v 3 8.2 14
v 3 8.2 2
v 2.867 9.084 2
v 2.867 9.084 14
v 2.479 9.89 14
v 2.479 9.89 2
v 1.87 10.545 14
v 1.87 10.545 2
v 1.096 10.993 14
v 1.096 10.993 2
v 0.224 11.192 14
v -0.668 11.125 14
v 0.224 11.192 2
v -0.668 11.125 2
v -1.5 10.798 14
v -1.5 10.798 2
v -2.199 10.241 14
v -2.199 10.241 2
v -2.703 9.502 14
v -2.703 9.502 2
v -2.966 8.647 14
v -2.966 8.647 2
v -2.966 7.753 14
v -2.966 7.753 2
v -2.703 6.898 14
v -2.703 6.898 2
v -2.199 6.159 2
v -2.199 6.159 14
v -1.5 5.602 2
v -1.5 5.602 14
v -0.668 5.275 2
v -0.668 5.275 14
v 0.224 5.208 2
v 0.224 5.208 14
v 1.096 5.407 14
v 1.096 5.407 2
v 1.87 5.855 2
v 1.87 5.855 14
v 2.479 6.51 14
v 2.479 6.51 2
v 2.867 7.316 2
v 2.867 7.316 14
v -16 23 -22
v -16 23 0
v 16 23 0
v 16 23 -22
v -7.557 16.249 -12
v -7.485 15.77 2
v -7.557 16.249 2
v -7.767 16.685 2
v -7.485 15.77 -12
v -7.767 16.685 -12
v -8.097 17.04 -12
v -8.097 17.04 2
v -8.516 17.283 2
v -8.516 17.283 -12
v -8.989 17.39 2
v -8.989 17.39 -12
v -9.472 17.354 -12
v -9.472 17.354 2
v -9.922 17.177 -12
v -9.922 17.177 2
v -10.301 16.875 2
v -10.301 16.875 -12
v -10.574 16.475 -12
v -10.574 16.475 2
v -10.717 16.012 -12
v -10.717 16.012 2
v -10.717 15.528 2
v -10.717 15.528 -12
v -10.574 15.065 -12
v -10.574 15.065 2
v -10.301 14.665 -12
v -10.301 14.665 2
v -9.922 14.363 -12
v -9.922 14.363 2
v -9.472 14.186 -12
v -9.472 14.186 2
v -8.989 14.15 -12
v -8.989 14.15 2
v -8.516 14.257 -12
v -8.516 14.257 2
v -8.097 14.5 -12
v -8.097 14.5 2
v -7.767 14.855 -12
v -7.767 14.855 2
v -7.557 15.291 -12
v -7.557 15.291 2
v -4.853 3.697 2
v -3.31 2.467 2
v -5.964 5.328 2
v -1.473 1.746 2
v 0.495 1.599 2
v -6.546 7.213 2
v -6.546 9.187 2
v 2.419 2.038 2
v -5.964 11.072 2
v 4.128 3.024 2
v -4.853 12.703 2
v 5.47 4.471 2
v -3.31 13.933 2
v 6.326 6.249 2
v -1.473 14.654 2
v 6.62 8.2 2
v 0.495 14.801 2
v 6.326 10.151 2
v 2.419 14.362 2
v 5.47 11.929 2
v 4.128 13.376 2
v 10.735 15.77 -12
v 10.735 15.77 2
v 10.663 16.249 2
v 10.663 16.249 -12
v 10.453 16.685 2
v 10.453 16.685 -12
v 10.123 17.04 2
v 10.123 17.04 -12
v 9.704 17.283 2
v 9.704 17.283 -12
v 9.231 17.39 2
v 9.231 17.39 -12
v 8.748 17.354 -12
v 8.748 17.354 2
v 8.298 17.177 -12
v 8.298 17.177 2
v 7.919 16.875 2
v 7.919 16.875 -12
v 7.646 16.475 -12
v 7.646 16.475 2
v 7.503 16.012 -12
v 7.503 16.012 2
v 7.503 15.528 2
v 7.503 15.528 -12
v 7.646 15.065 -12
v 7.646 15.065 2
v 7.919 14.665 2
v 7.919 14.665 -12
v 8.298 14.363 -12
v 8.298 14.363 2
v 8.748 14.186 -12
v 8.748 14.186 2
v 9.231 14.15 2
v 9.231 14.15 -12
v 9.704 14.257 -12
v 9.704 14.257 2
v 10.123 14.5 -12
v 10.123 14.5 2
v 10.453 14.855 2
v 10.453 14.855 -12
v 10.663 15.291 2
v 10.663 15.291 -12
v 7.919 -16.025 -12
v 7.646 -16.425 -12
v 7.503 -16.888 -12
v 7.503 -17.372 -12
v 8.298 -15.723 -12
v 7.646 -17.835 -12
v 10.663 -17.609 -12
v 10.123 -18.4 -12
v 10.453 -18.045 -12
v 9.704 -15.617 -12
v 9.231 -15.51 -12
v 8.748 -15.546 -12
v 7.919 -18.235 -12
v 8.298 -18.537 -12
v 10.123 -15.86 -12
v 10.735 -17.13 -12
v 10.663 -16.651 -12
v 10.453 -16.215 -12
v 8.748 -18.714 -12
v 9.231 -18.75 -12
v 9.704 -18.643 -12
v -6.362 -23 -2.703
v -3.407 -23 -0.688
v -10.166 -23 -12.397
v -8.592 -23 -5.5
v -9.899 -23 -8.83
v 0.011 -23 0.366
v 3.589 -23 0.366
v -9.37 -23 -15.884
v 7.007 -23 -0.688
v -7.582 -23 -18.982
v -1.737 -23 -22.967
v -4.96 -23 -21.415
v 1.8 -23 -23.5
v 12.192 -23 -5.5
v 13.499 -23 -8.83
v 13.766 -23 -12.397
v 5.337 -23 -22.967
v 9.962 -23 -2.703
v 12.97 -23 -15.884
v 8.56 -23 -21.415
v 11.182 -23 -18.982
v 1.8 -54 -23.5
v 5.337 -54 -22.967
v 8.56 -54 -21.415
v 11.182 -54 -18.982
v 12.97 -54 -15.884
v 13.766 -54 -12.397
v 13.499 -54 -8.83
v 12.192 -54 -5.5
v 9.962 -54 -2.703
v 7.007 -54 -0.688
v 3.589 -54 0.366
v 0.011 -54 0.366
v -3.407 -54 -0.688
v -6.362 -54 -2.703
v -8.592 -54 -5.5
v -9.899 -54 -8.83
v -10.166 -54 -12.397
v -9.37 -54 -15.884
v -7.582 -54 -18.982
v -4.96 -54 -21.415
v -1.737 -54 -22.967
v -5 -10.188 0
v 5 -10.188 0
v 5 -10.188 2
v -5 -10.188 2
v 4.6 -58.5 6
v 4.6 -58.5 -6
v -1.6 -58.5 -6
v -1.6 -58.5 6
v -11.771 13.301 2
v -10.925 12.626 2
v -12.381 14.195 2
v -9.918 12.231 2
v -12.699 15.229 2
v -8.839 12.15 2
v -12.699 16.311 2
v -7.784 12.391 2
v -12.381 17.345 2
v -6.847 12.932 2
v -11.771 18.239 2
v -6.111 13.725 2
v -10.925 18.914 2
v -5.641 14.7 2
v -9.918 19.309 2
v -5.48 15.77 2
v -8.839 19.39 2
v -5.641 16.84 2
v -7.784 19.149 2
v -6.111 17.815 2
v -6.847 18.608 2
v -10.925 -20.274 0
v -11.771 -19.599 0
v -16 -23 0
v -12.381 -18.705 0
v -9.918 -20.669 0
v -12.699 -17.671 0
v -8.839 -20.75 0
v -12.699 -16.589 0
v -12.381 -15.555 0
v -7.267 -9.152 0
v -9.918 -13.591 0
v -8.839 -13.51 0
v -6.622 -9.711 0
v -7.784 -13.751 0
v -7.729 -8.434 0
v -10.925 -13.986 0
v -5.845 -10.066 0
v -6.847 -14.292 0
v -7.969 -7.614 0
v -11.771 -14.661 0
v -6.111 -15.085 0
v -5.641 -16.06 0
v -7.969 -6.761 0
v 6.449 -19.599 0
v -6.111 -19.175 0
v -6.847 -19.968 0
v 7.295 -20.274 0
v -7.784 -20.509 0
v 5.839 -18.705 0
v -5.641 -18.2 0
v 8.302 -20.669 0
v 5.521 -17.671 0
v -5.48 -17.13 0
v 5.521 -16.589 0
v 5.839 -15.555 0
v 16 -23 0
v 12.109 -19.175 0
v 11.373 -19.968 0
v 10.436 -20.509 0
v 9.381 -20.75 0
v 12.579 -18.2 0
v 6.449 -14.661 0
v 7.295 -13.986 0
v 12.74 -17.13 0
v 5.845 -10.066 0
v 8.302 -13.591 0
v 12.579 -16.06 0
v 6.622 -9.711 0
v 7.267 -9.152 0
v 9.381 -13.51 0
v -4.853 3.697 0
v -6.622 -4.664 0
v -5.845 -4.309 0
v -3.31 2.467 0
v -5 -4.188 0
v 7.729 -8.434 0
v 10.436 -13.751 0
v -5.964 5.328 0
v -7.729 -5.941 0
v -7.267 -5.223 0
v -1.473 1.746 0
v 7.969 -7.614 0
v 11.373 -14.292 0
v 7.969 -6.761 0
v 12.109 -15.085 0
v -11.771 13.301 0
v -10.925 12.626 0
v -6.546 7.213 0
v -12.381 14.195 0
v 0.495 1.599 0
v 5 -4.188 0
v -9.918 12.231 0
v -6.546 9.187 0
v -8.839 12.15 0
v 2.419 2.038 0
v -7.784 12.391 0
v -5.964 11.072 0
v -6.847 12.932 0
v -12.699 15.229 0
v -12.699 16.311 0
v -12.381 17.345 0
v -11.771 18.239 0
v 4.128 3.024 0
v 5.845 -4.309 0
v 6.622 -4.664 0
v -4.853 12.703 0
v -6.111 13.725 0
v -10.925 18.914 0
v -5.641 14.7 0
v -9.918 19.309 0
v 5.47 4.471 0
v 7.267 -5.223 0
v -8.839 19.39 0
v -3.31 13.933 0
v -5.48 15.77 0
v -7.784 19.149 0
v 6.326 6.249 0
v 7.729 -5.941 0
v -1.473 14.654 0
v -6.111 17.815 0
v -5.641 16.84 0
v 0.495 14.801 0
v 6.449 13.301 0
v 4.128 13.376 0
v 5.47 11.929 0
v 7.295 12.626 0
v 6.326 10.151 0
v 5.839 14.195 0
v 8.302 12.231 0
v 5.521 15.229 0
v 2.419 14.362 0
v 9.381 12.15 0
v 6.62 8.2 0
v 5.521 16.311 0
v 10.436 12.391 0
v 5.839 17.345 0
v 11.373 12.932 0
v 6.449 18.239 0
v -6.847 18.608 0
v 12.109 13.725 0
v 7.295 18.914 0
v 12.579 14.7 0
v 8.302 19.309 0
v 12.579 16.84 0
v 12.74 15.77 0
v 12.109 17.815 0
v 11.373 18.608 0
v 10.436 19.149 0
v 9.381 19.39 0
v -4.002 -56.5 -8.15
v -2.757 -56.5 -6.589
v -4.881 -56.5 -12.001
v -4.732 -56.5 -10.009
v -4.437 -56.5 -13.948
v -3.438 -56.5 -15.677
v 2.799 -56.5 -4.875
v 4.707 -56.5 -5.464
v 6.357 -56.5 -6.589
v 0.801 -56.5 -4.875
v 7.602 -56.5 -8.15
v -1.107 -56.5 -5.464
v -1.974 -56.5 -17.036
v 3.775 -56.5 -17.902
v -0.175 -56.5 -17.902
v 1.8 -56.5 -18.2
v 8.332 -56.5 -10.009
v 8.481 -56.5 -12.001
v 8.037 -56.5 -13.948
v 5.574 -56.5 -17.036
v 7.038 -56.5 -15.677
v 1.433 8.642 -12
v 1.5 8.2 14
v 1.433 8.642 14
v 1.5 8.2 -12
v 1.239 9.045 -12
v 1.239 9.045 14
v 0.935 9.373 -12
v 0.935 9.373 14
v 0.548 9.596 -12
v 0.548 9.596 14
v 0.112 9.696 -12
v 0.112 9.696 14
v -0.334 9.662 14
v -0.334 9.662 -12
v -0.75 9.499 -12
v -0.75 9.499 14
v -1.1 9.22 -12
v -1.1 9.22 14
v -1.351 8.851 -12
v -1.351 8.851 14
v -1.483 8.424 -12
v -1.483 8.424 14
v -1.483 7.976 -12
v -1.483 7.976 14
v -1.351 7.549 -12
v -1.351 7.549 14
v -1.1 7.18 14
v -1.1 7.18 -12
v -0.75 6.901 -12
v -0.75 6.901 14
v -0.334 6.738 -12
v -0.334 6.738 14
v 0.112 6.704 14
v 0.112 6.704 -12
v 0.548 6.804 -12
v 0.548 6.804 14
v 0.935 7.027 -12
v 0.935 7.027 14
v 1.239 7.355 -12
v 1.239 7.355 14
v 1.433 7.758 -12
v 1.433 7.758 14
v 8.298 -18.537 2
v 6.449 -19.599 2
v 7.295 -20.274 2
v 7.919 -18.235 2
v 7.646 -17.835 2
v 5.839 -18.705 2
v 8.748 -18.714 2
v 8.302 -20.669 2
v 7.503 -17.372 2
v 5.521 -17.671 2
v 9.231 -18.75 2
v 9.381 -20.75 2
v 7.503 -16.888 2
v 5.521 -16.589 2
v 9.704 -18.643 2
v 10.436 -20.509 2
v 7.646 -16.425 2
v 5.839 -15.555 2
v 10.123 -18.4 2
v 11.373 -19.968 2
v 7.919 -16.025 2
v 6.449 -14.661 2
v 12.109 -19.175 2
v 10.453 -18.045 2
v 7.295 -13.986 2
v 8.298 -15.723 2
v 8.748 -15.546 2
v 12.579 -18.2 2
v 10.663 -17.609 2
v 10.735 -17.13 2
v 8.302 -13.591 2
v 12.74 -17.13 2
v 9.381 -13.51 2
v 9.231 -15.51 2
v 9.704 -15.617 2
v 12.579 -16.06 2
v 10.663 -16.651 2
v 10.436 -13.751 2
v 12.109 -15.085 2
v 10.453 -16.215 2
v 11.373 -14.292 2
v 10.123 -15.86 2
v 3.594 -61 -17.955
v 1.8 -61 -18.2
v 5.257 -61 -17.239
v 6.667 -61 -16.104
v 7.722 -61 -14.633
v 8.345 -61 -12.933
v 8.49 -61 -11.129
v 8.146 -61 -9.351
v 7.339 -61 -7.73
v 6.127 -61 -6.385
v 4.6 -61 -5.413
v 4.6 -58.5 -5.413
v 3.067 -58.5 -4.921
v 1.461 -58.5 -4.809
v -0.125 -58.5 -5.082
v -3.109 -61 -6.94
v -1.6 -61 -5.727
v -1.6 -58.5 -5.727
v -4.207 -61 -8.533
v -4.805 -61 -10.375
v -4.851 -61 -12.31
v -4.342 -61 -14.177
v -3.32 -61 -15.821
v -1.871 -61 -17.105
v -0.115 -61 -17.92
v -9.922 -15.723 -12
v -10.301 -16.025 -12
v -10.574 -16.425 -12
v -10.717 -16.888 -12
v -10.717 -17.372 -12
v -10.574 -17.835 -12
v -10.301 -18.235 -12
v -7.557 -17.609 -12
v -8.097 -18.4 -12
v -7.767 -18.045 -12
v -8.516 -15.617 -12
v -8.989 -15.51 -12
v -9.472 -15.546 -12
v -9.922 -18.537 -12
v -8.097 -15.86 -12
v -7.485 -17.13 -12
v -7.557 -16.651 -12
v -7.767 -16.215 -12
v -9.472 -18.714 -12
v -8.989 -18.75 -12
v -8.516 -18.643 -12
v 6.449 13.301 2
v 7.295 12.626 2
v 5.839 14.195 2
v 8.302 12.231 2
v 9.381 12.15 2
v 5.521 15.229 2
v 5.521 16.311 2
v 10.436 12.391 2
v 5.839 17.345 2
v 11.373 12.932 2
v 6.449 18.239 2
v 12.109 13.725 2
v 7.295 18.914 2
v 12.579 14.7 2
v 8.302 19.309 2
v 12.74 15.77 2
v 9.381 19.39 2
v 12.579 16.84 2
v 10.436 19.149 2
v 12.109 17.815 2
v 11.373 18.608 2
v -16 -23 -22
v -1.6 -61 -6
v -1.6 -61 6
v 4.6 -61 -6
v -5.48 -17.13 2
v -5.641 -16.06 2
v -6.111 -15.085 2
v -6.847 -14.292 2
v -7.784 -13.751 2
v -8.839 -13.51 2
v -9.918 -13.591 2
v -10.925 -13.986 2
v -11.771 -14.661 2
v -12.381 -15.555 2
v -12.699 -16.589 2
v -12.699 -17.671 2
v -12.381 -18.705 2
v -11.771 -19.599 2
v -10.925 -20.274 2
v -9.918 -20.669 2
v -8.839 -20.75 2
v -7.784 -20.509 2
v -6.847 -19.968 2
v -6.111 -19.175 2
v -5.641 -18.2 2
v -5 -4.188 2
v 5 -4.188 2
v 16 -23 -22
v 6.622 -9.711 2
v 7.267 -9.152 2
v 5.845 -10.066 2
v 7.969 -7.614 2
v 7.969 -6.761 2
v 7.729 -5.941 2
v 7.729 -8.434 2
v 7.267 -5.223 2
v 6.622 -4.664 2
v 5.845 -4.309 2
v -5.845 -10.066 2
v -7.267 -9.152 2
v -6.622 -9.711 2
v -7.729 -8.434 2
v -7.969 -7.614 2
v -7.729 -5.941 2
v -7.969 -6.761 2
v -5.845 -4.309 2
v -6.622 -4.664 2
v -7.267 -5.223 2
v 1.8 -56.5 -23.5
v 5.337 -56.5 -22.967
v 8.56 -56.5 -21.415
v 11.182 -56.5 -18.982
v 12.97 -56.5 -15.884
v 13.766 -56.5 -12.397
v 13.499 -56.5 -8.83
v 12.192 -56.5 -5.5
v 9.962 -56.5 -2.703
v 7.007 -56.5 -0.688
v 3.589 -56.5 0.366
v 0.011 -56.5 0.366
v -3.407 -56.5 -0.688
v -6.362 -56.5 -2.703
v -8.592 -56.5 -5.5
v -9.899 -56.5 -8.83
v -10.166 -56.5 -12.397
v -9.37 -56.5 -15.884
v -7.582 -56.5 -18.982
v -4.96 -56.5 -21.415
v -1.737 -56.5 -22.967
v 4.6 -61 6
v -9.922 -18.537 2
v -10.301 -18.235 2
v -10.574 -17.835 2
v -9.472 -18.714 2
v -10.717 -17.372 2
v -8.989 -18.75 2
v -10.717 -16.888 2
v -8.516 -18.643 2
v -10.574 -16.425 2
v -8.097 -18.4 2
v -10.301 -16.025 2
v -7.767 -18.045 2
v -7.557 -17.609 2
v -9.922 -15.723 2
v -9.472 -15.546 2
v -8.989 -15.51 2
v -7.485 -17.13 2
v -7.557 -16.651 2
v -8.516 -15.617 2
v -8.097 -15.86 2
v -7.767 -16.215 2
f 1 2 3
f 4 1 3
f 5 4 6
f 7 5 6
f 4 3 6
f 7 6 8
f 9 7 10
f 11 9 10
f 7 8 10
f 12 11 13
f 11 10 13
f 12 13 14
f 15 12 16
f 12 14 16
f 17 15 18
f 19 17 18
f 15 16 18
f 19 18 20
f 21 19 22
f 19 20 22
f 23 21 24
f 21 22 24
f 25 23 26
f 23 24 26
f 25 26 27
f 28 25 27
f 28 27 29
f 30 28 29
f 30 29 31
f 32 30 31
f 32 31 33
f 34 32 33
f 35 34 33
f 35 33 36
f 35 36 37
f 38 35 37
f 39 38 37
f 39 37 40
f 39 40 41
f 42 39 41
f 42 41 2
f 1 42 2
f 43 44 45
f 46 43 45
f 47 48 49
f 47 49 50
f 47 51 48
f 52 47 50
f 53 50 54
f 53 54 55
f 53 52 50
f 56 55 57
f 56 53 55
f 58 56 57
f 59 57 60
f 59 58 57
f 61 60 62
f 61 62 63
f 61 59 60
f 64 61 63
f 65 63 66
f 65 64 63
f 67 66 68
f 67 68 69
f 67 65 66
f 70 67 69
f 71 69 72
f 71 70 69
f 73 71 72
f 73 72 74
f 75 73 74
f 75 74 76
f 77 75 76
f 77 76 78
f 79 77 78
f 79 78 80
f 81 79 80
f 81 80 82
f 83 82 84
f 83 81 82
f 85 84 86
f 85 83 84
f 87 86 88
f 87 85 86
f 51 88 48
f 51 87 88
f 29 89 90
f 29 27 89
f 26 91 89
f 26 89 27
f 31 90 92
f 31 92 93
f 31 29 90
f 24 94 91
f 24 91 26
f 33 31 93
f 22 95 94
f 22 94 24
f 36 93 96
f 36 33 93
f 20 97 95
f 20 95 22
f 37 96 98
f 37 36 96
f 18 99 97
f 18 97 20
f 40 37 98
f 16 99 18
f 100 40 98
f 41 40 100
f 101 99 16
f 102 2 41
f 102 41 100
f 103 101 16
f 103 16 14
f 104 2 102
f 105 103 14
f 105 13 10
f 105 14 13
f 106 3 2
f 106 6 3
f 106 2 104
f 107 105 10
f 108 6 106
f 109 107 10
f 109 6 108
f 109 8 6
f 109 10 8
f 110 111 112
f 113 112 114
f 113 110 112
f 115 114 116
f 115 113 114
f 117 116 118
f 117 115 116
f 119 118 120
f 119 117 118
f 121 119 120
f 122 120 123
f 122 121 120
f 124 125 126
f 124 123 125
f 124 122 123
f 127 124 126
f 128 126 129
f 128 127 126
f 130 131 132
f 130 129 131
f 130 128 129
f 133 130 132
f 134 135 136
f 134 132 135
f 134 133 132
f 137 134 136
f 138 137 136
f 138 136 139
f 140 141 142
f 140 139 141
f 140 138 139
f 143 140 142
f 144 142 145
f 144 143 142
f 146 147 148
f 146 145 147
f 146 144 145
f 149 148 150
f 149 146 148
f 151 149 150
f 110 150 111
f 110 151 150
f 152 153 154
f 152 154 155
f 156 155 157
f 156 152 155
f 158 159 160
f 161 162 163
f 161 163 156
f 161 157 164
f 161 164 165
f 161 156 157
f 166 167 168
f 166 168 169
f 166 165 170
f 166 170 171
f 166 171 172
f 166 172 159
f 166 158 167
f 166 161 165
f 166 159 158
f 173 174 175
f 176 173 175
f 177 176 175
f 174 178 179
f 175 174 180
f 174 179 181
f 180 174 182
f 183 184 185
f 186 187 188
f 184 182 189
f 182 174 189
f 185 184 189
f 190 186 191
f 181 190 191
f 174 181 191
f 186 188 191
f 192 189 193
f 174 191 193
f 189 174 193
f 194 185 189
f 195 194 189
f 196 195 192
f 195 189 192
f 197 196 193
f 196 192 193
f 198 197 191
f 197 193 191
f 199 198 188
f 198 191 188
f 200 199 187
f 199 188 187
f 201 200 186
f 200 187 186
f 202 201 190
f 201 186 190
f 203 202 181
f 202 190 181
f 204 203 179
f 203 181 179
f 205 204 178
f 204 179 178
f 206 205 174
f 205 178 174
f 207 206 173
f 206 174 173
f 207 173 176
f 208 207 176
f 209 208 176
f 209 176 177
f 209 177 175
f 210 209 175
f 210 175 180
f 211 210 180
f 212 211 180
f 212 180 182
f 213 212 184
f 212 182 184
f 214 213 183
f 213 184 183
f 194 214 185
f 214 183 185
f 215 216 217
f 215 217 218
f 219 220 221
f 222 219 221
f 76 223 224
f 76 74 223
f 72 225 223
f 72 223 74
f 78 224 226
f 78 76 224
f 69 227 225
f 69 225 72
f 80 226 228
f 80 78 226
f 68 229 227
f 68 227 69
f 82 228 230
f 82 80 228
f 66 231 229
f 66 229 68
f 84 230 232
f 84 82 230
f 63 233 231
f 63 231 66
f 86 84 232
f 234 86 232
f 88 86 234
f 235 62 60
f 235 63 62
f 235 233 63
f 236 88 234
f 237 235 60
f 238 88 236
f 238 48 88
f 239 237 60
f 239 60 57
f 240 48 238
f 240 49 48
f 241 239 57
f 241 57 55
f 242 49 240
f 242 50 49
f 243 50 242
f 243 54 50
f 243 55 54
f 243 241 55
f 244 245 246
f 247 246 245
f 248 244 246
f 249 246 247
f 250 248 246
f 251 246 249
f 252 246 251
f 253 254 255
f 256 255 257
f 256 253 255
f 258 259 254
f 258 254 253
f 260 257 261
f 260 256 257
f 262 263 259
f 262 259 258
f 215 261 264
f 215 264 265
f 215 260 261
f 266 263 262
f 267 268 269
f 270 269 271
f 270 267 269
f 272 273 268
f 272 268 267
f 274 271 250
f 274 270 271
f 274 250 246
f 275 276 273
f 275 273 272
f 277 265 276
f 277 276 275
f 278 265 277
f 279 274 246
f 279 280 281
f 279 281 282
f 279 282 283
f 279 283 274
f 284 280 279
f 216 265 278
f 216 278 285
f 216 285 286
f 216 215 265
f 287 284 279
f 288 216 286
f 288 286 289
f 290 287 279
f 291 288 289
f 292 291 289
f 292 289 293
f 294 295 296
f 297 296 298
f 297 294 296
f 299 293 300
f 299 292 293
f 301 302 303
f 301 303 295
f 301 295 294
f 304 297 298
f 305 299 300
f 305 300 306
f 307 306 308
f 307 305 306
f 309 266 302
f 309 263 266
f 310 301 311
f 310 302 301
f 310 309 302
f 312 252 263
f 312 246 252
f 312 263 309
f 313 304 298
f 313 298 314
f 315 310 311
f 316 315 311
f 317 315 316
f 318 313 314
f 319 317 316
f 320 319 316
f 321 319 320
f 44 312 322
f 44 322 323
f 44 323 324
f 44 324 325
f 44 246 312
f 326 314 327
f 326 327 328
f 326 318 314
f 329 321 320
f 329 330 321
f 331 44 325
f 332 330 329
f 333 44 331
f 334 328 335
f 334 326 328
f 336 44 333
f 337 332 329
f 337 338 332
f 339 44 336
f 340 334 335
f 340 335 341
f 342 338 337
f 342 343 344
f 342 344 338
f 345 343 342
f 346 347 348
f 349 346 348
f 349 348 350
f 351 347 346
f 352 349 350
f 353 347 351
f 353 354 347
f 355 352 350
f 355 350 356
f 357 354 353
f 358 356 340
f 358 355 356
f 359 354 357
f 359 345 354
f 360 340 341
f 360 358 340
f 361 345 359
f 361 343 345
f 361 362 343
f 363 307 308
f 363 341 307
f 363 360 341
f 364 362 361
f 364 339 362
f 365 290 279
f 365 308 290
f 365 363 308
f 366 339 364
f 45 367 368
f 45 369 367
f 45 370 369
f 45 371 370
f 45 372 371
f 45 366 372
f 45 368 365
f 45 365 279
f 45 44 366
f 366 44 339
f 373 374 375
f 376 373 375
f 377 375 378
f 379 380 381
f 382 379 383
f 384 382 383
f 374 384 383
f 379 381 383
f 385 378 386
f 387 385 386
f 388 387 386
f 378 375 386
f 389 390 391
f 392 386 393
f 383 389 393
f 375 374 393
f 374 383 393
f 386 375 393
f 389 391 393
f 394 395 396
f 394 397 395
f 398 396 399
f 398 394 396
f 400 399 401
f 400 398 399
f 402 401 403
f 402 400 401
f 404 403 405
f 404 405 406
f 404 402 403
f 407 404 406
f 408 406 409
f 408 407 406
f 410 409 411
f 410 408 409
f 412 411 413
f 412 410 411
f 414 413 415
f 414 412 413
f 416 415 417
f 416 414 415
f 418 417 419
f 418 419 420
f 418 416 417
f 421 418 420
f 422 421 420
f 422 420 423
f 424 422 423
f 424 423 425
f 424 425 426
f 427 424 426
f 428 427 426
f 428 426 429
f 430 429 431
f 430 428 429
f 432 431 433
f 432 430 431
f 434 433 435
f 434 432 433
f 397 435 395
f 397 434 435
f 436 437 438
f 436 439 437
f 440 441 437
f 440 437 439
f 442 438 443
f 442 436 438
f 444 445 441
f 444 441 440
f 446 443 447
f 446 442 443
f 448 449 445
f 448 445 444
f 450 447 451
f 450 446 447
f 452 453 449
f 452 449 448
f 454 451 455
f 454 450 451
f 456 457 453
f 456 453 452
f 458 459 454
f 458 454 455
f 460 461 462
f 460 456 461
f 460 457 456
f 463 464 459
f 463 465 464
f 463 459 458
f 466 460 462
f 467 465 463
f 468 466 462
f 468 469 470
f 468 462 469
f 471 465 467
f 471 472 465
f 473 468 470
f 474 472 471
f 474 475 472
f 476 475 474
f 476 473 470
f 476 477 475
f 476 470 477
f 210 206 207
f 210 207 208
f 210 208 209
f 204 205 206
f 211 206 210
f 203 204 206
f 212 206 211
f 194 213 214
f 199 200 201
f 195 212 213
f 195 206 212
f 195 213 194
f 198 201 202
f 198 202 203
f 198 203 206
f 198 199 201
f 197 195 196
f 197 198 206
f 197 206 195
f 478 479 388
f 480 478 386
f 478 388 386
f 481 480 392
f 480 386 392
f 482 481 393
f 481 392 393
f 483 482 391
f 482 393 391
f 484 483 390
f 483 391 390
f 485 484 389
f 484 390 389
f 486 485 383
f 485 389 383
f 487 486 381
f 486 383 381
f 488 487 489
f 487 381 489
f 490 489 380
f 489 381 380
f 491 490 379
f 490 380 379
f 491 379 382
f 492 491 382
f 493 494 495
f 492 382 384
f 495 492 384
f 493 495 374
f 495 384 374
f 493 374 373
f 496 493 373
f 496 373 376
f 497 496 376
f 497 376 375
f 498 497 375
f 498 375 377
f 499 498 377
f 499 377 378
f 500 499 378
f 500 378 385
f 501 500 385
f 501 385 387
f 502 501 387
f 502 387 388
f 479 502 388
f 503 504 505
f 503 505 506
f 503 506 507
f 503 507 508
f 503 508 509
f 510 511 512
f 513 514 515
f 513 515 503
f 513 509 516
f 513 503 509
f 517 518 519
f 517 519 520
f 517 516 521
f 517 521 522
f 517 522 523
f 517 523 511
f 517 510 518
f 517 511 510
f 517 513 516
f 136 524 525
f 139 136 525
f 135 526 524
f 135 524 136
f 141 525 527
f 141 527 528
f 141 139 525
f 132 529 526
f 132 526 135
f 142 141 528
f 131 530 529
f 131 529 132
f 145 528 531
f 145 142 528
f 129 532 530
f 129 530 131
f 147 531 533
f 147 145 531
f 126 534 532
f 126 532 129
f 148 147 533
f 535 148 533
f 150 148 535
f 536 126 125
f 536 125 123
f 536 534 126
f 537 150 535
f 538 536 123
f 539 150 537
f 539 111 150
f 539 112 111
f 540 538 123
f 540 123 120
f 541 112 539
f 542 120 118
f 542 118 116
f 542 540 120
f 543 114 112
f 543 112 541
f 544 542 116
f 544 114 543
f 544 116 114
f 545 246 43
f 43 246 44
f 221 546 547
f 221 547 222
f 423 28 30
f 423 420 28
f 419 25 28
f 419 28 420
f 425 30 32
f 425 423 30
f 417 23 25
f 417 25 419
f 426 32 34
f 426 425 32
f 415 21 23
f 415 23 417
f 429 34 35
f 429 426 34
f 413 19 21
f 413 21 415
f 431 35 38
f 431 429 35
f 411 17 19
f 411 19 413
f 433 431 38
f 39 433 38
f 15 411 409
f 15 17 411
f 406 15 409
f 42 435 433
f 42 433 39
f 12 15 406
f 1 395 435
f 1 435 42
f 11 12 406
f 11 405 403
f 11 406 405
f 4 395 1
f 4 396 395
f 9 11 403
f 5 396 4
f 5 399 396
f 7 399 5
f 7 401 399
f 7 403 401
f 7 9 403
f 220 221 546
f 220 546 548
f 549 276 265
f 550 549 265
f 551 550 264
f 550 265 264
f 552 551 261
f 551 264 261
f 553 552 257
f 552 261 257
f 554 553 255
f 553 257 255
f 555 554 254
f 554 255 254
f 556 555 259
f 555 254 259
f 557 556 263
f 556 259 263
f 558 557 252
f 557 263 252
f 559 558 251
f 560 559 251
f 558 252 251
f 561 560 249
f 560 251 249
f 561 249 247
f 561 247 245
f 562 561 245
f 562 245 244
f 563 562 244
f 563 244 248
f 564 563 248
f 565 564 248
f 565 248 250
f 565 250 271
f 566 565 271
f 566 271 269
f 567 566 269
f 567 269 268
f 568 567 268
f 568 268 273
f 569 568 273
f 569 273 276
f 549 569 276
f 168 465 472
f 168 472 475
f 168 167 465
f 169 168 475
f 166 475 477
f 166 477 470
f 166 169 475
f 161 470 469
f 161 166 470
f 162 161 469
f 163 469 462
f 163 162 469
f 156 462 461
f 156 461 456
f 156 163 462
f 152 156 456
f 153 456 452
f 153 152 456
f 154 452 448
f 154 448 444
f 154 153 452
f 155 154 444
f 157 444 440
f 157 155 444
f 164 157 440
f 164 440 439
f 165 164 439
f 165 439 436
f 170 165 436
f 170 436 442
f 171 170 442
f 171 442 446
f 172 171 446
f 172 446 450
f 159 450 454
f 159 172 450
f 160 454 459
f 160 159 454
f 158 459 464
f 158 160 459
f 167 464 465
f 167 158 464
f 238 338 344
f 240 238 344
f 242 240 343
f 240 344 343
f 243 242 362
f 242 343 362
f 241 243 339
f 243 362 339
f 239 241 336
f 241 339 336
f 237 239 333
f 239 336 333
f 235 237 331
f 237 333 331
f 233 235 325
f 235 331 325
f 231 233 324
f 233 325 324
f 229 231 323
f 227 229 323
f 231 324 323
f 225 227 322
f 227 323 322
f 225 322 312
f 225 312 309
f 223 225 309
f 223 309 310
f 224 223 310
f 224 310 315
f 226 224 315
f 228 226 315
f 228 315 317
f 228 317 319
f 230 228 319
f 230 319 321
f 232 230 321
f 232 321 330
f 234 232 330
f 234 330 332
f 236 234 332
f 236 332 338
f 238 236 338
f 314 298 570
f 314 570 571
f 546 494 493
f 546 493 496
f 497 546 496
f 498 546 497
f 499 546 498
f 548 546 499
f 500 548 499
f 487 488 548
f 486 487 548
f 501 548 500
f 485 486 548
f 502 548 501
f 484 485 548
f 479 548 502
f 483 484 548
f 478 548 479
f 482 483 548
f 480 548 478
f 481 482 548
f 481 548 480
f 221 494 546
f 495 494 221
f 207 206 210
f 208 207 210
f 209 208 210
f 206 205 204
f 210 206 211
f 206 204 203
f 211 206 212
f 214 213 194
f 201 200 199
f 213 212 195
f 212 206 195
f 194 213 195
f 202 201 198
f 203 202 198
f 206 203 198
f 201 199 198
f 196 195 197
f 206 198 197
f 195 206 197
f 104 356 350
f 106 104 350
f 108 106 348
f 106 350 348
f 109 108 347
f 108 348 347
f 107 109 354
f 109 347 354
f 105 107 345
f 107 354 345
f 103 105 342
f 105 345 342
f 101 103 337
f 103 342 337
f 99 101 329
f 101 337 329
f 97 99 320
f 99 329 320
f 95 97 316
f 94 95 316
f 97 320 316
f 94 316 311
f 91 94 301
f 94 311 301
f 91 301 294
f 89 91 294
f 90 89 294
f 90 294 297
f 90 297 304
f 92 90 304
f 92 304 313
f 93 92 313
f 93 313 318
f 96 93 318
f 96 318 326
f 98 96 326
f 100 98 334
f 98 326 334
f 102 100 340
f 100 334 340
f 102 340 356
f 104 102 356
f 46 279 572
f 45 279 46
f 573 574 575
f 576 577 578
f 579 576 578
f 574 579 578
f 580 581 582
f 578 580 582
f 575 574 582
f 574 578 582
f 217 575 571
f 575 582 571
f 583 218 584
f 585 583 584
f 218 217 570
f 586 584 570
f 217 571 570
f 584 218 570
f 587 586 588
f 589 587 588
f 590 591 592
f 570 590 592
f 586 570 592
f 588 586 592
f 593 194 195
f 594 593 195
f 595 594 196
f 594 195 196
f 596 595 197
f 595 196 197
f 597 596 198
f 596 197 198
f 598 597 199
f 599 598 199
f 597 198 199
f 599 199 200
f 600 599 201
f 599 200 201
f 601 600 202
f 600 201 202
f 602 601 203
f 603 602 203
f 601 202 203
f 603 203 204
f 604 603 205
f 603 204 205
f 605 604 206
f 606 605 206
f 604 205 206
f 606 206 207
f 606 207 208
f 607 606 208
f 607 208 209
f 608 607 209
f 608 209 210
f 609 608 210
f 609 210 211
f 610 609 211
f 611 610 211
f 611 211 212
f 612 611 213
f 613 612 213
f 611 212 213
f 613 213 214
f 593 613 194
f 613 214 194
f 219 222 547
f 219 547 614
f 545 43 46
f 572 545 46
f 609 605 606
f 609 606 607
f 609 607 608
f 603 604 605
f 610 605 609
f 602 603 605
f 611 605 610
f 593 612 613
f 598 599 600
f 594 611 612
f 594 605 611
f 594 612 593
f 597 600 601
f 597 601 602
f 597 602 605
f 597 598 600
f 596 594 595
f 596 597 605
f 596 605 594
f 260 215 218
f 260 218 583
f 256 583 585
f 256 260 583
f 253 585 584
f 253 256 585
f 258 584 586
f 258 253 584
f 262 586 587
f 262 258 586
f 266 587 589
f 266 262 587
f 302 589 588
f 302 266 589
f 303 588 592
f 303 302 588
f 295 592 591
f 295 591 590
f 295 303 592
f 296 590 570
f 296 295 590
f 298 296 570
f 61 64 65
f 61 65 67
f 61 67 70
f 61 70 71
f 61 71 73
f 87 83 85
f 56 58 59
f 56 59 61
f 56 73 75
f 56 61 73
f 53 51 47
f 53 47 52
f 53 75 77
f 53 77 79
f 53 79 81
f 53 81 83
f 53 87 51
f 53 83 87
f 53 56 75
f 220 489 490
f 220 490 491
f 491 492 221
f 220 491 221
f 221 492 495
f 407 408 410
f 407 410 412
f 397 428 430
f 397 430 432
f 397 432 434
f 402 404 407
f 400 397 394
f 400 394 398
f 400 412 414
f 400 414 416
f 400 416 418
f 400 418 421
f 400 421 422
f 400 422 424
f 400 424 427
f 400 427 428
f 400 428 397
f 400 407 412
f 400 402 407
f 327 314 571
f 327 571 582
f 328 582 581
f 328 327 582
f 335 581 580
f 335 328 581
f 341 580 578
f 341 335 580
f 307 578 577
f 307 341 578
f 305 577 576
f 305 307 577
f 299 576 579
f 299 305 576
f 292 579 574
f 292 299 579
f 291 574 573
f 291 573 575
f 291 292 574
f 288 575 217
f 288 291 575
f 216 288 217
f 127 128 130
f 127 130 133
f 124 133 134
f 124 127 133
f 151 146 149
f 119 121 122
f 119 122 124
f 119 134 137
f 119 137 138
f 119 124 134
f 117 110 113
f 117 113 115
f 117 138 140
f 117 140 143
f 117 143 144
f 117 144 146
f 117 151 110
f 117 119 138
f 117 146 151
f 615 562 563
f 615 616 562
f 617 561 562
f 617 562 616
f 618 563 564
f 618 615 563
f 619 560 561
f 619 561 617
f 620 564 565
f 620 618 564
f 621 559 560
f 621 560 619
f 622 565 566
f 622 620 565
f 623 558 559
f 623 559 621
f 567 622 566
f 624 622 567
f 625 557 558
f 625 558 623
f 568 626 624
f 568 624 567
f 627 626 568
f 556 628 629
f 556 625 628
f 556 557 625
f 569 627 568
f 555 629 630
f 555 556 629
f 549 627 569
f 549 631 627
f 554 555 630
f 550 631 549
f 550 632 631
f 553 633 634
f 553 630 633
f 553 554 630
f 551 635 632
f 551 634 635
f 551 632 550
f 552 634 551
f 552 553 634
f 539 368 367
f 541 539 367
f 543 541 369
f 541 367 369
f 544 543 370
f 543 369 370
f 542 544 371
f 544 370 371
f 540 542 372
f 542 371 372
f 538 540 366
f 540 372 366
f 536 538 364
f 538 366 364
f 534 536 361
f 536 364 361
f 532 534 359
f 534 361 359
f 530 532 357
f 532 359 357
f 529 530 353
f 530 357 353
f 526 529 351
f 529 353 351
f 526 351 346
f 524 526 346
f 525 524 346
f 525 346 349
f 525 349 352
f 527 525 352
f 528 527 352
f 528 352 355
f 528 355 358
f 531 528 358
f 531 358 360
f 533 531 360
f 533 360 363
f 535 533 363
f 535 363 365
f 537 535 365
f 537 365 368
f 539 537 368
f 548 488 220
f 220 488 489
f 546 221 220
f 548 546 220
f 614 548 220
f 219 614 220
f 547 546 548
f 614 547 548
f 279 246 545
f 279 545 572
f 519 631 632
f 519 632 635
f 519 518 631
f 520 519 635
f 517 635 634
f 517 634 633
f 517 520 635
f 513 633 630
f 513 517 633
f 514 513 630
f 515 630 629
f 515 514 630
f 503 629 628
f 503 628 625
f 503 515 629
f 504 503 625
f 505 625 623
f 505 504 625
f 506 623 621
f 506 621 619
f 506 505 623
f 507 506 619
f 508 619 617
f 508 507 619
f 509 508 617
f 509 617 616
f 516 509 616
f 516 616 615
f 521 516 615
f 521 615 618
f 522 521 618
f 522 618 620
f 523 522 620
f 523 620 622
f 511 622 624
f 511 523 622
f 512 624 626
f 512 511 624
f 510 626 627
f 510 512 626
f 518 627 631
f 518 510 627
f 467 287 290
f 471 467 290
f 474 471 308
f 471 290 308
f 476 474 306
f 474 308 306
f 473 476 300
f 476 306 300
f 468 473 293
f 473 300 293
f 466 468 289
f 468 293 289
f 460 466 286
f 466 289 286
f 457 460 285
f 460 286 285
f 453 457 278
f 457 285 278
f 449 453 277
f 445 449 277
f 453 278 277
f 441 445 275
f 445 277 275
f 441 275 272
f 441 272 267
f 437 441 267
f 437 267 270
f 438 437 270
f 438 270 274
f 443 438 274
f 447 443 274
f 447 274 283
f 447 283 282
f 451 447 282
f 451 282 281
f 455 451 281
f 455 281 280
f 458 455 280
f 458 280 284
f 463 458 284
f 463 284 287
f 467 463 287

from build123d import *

# Parameters (mm, degrees)
SKETCH1_W                = 32
SKETCH1_H                = 46
SKETCH1_R                = 3.63
BOSS_EXTRUDE1_DEPTH      = 22
BOSS_EXTRUDE2_DEPTH      = 2
BOSS_EXTRUDE2_DEPTH_BACK = 22
SKETCH1_3_R              = 3.63
SKETCH1_3_R_2            = 1.625
SKETCH1_4_R              = 3
SKETCH1_4_R_2            = 1.5
BOSS_EXTRUDE3_DEPTH      = 14
SKETCH1_5_R              = 6.62
SKETCH1_5_R_2            = 3
BOSS_EXTRUDE4_DEPTH      = 2
CUT_EXTRUDE1_START       = -12
SKETCH1_6_R              = 1.625
SKETCH1_6_R_2            = 1.5
CUT_EXTRUDE1_DEPTH       = 12
CUT_EXTRUDE2_DEPTH       = 12
CUT_EXTRUDE2_DEPTH_BACK  = 12
SKETCH1_7_R              = 1.625
SKETCH2_R                = 12
BOSS_EXTRUDE5_DEPTH      = 31
SKETCH3_R                = 12
BOSS_EXTRUDE6_DEPTH      = 2.5
SKETCH4_R                = 6.7
BOSS_EXTRUDE7_DEPTH      = 4.5
SKETCH5_W                = 1.6
SKETCH5_H                = 2.5
SKETCH5_W_2              = 1.2
SKETCH5_W_3              = 1
CUT_EXTRUDE4_DEPTH       = 6
BOSS_EXTRUDE9_DEPTH      = 6
BOSS_EXTRUDE9_DEPTH_BACK = 6
SKETCH5_4_W              = 1.2
SKETCH5_4_H              = 2.5
SKETCH5_4_W_2            = 1
SKETCH5_4_W_3            = 1.6


with BuildPart() as part:
    # Sketch1 → Boss-Extrude1 (new body)
    with BuildSketch(Plane.XY):
        Rectangle(SKETCH1_W, SKETCH1_H)
        with Locations((9.11, 15.77)):
            Circle(SKETCH1_R, mode=Mode.SUBTRACT)
        with BuildLine():
            Line((-5, -4.1875), (5, -4.1875))
            ThreePointArc((5, -4.1875), (8, -7.1875), (5, -10.1875))
            Line((5, -10.1875), (-5, -10.1875))
            ThreePointArc((-5, -10.1875), (-8, -7.1875), (-5, -4.1875))
        make_face(mode=Mode.SUBTRACT)
    extrude(amount=-BOSS_EXTRUDE1_DEPTH)

    # Sketch1<3> → Boss-Extrude2 (add, two sides: drawn at the far end of the back side and taken through both)
    # profile 1 of 5: a face of its own
    with BuildSketch(Plane.XY.offset(-BOSS_EXTRUDE2_DEPTH_BACK)):
        with Locations((9.11, 15.77)):
            Circle(SKETCH1_3_R)
    # profile 2 of 5: a face of its own
    with BuildSketch(Plane.XY.offset(-BOSS_EXTRUDE2_DEPTH_BACK)):
        with Locations((9.11, -17.13)):
            Circle(SKETCH1_3_R)
        with Locations((9.11, -17.13)):
            Circle(SKETCH1_3_R_2, mode=Mode.SUBTRACT)
    # profile 3 of 5: a face of its own
    with BuildSketch(Plane.XY.offset(-BOSS_EXTRUDE2_DEPTH_BACK)):
        with Locations((-9.11, -17.13)):
            Circle(SKETCH1_3_R)
        with Locations((-9.11, -17.13)):
            Circle(SKETCH1_3_R_2, mode=Mode.SUBTRACT)
    # profile 4 of 5: a face of its own
    with BuildSketch(Plane.XY.offset(-BOSS_EXTRUDE2_DEPTH_BACK)):
        with Locations((-9.11, 15.77)):
            Circle(SKETCH1_3_R)
        with Locations((-9.11, 15.77)):
            Circle(SKETCH1_3_R_2, mode=Mode.SUBTRACT)
    # profile 5 of 5: a face of its own
    with BuildSketch(Plane.XY.offset(-BOSS_EXTRUDE2_DEPTH_BACK)):
        with BuildLine():
            Line((-5, -4.1875), (5, -4.1875))
            ThreePointArc((5, -4.1875), (8, -7.1875), (5, -10.1875))
            Line((5, -10.1875), (-5, -10.1875))
            ThreePointArc((-5, -10.1875), (-8, -7.1875), (-5, -4.1875))
        make_face()
    extrude(amount=BOSS_EXTRUDE2_DEPTH + BOSS_EXTRUDE2_DEPTH_BACK)

    # Sketch1<4> → Boss-Extrude3 (add)
    with BuildSketch(Plane.XY):
        with Locations((0, 8.2)):
            Circle(SKETCH1_4_R)
        with Locations((0, 8.2)):
            Circle(SKETCH1_4_R_2, mode=Mode.SUBTRACT)
    extrude(amount=BOSS_EXTRUDE3_DEPTH)

    # Sketch1<5> → Boss-Extrude4 (add)
    with BuildSketch(Plane.XY):
        with Locations((0, 8.2)):
            Circle(SKETCH1_5_R)
        with Locations((0, 8.2)):
            Circle(SKETCH1_5_R_2, mode=Mode.SUBTRACT)
    extrude(amount=BOSS_EXTRUDE4_DEPTH)

    # Sketch1<6> → Cut-Extrude1 (cut)
    with BuildSketch(Plane.XY.offset(CUT_EXTRUDE1_START)):
        with Locations((-9.11, 15.77)):
            Circle(SKETCH1_6_R)
        with Locations((0, 8.2)):
            Circle(SKETCH1_6_R_2)
        with Locations((-9.11, -17.13)):
            Circle(SKETCH1_6_R)
        with Locations((9.11, -17.13)):
            Circle(SKETCH1_6_R)
        with Locations((9.11, 15.77)):
            Circle(SKETCH1_6_R)
    extrude(amount=CUT_EXTRUDE1_DEPTH, mode=Mode.SUBTRACT)

    # Sketch1<7> → Cut-Extrude2 (cut, two sides: drawn at the far end of the back side and taken through both)
    with BuildSketch(Plane.XY.offset(-CUT_EXTRUDE2_DEPTH_BACK)):
        with Locations((9.11, 15.77)):
            Circle(SKETCH1_7_R)
    extrude(amount=CUT_EXTRUDE2_DEPTH + CUT_EXTRUDE2_DEPTH_BACK, mode=Mode.SUBTRACT)


with BuildPart() as body_2:
    # Sketch2 → Boss-Extrude5 (new body)
    with BuildSketch(Plane.XZ.offset(23)):
        with Locations(Location((1.8, -11.5, 0), (0, 0, 270))):
            Circle(SKETCH2_R)
    extrude(amount=BOSS_EXTRUDE5_DEPTH)


with BuildPart() as body_3:
    # Sketch3 → Boss-Extrude6 (new body)
    with BuildSketch(Plane.XZ.offset(54)):
        with Locations(Location((1.8, -11.5, 0), (0, 0, 270))):
            Circle(SKETCH3_R)
    extrude(amount=BOSS_EXTRUDE6_DEPTH)


with BuildPart() as body_4:
    # Sketch4 → Boss-Extrude7 (new body)
    with BuildSketch(Plane.XZ.offset(56.5)):
        with Locations(Location((1.8, -11.5, 0), (0, 0, 270))):
            Circle(SKETCH4_R)
    extrude(amount=BOSS_EXTRUDE7_DEPTH)

    # Sketch5 → Cut-Extrude4 (cut)
    with BuildSketch(Plane.XY):
        with Locations((3.8, -59.75)):
            Rectangle(SKETCH5_W, SKETCH5_H)
        with Locations((2.4, -59.75)):
            Rectangle(SKETCH5_W_2, SKETCH5_H)
        with Locations((1.3, -59.75)):
            Rectangle(SKETCH5_W_3, SKETCH5_H)
        with Locations((0.2, -59.75)):
            Rectangle(SKETCH5_W_2, SKETCH5_H)
        with Locations((-1, -59.75)):
            Rectangle(SKETCH5_W_2, SKETCH5_H)
    extrude(amount=-CUT_EXTRUDE4_DEPTH, mode=Mode.SUBTRACT)


with BuildPart() as body_5:
    # Sketch5<4> → Boss-Extrude9 (new, two sides: drawn at the far end of the back side and taken through both)
    with BuildSketch(Plane.XY.offset(-BOSS_EXTRUDE9_DEPTH_BACK)):
        with Locations((-1, -59.75)):
            Rectangle(SKETCH5_4_W, SKETCH5_4_H)
        with Locations((0.2, -59.75)):
            Rectangle(SKETCH5_4_W, SKETCH5_4_H)
        with Locations((1.3, -59.75)):
            Rectangle(SKETCH5_4_W_2, SKETCH5_4_H)
        with Locations((2.4, -59.75)):
            Rectangle(SKETCH5_4_W, SKETCH5_4_H)
        with Locations((3.8, -59.75)):
            Rectangle(SKETCH5_4_W_3, SKETCH5_4_H)
    extrude(amount=BOSS_EXTRUDE9_DEPTH + BOSS_EXTRUDE9_DEPTH_BACK)


solid = Compound([part.part, body_2.part, body_3.part, body_4.part, body_5.part])
